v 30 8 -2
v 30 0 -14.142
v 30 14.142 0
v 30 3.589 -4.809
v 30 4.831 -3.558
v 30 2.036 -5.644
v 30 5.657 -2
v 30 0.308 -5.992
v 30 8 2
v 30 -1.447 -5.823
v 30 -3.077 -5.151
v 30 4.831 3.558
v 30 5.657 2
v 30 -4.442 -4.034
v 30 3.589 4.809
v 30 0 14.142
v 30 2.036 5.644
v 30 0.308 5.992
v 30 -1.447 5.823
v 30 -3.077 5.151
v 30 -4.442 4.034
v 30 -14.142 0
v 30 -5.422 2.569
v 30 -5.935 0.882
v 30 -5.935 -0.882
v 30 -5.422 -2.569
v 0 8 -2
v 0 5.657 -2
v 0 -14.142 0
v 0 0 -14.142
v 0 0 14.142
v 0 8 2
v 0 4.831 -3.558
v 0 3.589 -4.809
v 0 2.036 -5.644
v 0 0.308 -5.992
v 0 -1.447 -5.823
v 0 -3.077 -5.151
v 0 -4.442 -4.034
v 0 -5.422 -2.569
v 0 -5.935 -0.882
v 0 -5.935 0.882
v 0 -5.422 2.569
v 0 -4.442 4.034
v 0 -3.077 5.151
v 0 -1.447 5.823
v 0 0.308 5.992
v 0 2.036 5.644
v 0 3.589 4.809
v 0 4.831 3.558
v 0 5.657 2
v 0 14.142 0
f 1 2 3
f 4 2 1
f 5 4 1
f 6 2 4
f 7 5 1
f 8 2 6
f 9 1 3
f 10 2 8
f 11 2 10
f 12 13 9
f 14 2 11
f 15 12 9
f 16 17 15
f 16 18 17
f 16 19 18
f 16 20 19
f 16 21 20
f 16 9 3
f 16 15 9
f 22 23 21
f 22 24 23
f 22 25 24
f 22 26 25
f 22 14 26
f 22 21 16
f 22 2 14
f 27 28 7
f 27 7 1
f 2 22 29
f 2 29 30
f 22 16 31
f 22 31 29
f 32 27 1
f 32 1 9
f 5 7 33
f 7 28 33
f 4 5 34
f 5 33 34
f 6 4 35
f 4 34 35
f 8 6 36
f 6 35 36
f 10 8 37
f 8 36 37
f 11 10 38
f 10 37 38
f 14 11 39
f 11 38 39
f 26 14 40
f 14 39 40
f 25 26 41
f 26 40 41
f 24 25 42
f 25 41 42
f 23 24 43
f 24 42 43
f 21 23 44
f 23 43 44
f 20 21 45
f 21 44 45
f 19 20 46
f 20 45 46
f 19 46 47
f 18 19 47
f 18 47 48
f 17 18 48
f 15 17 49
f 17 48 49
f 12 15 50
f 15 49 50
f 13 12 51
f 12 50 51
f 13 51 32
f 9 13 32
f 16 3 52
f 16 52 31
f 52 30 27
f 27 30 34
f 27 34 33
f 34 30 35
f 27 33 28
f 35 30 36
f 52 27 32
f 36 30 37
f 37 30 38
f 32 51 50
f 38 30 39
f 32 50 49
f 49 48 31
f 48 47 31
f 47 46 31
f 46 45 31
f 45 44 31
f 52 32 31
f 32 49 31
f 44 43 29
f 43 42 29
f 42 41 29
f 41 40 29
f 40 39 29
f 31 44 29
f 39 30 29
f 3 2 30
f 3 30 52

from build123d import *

# Parameters (mm, degrees)
SKETCH1_W          = 30
SKETCH1_H          = 17.5
SKETCH5_R          = 6
CUT_EXTRUDE3_DEPTH = 39.890872965
SKETCH6_W          = 4
SKETCH6_H          = 4
CUT_EXTRUDE5_DEPTH = 39.890872965
SKETCH7_OUTSIDE_W  = 48.576
SKETCH7_OUTSIDE_H  = 48.576
CUT_EXTRUDE6_DEPTH = 39.890872965


with BuildPart() as part:
    # Sketch1 → Revolve1 (revolve)
    with BuildSketch(Plane.XY, mode=Mode.PRIVATE) as revolve1_sk:
        with Locations((15, 8.75)):
            Rectangle(SKETCH1_W, SKETCH1_H)
    revolve(revolve1_sk.sketch.rotate(Axis((0, 0, 0), (-1, 0, 0)), 90), axis=Axis((0, 0, 0), (-1, 0, 0)))

    # Sketch5 → Cut-Extrude3 (cut, through all)
    with BuildSketch(Plane.ZY):
        Circle(SKETCH5_R)
    extrude(amount=-CUT_EXTRUDE3_DEPTH, mode=Mode.SUBTRACT)

    # Sketch6 → Cut-Extrude5 (cut, through all)
    with BuildSketch(Plane.ZY):
        with Locations((0, 6)):
            Rectangle(SKETCH6_W, SKETCH6_H)
    extrude(amount=-CUT_EXTRUDE5_DEPTH, mode=Mode.SUBTRACT)

    # Sketch7 outside → Cut-Extrude6 (cut, through all)
    with BuildSketch(Plane(origin=(30, 0, 0), x_dir=(0, 0, -1), z_dir=(1, 0, 0))):
        Rectangle(SKETCH7_OUTSIDE_W, SKETCH7_OUTSIDE_H)
        Polygon((-14.142135624, 0), (0, -14.142135624), (14.142135624, 0), (0, 14.142135624), align=None, mode=Mode.SUBTRACT)
    extrude(amount=-CUT_EXTRUDE6_DEPTH, mode=Mode.SUBTRACT)


solid = part.part
